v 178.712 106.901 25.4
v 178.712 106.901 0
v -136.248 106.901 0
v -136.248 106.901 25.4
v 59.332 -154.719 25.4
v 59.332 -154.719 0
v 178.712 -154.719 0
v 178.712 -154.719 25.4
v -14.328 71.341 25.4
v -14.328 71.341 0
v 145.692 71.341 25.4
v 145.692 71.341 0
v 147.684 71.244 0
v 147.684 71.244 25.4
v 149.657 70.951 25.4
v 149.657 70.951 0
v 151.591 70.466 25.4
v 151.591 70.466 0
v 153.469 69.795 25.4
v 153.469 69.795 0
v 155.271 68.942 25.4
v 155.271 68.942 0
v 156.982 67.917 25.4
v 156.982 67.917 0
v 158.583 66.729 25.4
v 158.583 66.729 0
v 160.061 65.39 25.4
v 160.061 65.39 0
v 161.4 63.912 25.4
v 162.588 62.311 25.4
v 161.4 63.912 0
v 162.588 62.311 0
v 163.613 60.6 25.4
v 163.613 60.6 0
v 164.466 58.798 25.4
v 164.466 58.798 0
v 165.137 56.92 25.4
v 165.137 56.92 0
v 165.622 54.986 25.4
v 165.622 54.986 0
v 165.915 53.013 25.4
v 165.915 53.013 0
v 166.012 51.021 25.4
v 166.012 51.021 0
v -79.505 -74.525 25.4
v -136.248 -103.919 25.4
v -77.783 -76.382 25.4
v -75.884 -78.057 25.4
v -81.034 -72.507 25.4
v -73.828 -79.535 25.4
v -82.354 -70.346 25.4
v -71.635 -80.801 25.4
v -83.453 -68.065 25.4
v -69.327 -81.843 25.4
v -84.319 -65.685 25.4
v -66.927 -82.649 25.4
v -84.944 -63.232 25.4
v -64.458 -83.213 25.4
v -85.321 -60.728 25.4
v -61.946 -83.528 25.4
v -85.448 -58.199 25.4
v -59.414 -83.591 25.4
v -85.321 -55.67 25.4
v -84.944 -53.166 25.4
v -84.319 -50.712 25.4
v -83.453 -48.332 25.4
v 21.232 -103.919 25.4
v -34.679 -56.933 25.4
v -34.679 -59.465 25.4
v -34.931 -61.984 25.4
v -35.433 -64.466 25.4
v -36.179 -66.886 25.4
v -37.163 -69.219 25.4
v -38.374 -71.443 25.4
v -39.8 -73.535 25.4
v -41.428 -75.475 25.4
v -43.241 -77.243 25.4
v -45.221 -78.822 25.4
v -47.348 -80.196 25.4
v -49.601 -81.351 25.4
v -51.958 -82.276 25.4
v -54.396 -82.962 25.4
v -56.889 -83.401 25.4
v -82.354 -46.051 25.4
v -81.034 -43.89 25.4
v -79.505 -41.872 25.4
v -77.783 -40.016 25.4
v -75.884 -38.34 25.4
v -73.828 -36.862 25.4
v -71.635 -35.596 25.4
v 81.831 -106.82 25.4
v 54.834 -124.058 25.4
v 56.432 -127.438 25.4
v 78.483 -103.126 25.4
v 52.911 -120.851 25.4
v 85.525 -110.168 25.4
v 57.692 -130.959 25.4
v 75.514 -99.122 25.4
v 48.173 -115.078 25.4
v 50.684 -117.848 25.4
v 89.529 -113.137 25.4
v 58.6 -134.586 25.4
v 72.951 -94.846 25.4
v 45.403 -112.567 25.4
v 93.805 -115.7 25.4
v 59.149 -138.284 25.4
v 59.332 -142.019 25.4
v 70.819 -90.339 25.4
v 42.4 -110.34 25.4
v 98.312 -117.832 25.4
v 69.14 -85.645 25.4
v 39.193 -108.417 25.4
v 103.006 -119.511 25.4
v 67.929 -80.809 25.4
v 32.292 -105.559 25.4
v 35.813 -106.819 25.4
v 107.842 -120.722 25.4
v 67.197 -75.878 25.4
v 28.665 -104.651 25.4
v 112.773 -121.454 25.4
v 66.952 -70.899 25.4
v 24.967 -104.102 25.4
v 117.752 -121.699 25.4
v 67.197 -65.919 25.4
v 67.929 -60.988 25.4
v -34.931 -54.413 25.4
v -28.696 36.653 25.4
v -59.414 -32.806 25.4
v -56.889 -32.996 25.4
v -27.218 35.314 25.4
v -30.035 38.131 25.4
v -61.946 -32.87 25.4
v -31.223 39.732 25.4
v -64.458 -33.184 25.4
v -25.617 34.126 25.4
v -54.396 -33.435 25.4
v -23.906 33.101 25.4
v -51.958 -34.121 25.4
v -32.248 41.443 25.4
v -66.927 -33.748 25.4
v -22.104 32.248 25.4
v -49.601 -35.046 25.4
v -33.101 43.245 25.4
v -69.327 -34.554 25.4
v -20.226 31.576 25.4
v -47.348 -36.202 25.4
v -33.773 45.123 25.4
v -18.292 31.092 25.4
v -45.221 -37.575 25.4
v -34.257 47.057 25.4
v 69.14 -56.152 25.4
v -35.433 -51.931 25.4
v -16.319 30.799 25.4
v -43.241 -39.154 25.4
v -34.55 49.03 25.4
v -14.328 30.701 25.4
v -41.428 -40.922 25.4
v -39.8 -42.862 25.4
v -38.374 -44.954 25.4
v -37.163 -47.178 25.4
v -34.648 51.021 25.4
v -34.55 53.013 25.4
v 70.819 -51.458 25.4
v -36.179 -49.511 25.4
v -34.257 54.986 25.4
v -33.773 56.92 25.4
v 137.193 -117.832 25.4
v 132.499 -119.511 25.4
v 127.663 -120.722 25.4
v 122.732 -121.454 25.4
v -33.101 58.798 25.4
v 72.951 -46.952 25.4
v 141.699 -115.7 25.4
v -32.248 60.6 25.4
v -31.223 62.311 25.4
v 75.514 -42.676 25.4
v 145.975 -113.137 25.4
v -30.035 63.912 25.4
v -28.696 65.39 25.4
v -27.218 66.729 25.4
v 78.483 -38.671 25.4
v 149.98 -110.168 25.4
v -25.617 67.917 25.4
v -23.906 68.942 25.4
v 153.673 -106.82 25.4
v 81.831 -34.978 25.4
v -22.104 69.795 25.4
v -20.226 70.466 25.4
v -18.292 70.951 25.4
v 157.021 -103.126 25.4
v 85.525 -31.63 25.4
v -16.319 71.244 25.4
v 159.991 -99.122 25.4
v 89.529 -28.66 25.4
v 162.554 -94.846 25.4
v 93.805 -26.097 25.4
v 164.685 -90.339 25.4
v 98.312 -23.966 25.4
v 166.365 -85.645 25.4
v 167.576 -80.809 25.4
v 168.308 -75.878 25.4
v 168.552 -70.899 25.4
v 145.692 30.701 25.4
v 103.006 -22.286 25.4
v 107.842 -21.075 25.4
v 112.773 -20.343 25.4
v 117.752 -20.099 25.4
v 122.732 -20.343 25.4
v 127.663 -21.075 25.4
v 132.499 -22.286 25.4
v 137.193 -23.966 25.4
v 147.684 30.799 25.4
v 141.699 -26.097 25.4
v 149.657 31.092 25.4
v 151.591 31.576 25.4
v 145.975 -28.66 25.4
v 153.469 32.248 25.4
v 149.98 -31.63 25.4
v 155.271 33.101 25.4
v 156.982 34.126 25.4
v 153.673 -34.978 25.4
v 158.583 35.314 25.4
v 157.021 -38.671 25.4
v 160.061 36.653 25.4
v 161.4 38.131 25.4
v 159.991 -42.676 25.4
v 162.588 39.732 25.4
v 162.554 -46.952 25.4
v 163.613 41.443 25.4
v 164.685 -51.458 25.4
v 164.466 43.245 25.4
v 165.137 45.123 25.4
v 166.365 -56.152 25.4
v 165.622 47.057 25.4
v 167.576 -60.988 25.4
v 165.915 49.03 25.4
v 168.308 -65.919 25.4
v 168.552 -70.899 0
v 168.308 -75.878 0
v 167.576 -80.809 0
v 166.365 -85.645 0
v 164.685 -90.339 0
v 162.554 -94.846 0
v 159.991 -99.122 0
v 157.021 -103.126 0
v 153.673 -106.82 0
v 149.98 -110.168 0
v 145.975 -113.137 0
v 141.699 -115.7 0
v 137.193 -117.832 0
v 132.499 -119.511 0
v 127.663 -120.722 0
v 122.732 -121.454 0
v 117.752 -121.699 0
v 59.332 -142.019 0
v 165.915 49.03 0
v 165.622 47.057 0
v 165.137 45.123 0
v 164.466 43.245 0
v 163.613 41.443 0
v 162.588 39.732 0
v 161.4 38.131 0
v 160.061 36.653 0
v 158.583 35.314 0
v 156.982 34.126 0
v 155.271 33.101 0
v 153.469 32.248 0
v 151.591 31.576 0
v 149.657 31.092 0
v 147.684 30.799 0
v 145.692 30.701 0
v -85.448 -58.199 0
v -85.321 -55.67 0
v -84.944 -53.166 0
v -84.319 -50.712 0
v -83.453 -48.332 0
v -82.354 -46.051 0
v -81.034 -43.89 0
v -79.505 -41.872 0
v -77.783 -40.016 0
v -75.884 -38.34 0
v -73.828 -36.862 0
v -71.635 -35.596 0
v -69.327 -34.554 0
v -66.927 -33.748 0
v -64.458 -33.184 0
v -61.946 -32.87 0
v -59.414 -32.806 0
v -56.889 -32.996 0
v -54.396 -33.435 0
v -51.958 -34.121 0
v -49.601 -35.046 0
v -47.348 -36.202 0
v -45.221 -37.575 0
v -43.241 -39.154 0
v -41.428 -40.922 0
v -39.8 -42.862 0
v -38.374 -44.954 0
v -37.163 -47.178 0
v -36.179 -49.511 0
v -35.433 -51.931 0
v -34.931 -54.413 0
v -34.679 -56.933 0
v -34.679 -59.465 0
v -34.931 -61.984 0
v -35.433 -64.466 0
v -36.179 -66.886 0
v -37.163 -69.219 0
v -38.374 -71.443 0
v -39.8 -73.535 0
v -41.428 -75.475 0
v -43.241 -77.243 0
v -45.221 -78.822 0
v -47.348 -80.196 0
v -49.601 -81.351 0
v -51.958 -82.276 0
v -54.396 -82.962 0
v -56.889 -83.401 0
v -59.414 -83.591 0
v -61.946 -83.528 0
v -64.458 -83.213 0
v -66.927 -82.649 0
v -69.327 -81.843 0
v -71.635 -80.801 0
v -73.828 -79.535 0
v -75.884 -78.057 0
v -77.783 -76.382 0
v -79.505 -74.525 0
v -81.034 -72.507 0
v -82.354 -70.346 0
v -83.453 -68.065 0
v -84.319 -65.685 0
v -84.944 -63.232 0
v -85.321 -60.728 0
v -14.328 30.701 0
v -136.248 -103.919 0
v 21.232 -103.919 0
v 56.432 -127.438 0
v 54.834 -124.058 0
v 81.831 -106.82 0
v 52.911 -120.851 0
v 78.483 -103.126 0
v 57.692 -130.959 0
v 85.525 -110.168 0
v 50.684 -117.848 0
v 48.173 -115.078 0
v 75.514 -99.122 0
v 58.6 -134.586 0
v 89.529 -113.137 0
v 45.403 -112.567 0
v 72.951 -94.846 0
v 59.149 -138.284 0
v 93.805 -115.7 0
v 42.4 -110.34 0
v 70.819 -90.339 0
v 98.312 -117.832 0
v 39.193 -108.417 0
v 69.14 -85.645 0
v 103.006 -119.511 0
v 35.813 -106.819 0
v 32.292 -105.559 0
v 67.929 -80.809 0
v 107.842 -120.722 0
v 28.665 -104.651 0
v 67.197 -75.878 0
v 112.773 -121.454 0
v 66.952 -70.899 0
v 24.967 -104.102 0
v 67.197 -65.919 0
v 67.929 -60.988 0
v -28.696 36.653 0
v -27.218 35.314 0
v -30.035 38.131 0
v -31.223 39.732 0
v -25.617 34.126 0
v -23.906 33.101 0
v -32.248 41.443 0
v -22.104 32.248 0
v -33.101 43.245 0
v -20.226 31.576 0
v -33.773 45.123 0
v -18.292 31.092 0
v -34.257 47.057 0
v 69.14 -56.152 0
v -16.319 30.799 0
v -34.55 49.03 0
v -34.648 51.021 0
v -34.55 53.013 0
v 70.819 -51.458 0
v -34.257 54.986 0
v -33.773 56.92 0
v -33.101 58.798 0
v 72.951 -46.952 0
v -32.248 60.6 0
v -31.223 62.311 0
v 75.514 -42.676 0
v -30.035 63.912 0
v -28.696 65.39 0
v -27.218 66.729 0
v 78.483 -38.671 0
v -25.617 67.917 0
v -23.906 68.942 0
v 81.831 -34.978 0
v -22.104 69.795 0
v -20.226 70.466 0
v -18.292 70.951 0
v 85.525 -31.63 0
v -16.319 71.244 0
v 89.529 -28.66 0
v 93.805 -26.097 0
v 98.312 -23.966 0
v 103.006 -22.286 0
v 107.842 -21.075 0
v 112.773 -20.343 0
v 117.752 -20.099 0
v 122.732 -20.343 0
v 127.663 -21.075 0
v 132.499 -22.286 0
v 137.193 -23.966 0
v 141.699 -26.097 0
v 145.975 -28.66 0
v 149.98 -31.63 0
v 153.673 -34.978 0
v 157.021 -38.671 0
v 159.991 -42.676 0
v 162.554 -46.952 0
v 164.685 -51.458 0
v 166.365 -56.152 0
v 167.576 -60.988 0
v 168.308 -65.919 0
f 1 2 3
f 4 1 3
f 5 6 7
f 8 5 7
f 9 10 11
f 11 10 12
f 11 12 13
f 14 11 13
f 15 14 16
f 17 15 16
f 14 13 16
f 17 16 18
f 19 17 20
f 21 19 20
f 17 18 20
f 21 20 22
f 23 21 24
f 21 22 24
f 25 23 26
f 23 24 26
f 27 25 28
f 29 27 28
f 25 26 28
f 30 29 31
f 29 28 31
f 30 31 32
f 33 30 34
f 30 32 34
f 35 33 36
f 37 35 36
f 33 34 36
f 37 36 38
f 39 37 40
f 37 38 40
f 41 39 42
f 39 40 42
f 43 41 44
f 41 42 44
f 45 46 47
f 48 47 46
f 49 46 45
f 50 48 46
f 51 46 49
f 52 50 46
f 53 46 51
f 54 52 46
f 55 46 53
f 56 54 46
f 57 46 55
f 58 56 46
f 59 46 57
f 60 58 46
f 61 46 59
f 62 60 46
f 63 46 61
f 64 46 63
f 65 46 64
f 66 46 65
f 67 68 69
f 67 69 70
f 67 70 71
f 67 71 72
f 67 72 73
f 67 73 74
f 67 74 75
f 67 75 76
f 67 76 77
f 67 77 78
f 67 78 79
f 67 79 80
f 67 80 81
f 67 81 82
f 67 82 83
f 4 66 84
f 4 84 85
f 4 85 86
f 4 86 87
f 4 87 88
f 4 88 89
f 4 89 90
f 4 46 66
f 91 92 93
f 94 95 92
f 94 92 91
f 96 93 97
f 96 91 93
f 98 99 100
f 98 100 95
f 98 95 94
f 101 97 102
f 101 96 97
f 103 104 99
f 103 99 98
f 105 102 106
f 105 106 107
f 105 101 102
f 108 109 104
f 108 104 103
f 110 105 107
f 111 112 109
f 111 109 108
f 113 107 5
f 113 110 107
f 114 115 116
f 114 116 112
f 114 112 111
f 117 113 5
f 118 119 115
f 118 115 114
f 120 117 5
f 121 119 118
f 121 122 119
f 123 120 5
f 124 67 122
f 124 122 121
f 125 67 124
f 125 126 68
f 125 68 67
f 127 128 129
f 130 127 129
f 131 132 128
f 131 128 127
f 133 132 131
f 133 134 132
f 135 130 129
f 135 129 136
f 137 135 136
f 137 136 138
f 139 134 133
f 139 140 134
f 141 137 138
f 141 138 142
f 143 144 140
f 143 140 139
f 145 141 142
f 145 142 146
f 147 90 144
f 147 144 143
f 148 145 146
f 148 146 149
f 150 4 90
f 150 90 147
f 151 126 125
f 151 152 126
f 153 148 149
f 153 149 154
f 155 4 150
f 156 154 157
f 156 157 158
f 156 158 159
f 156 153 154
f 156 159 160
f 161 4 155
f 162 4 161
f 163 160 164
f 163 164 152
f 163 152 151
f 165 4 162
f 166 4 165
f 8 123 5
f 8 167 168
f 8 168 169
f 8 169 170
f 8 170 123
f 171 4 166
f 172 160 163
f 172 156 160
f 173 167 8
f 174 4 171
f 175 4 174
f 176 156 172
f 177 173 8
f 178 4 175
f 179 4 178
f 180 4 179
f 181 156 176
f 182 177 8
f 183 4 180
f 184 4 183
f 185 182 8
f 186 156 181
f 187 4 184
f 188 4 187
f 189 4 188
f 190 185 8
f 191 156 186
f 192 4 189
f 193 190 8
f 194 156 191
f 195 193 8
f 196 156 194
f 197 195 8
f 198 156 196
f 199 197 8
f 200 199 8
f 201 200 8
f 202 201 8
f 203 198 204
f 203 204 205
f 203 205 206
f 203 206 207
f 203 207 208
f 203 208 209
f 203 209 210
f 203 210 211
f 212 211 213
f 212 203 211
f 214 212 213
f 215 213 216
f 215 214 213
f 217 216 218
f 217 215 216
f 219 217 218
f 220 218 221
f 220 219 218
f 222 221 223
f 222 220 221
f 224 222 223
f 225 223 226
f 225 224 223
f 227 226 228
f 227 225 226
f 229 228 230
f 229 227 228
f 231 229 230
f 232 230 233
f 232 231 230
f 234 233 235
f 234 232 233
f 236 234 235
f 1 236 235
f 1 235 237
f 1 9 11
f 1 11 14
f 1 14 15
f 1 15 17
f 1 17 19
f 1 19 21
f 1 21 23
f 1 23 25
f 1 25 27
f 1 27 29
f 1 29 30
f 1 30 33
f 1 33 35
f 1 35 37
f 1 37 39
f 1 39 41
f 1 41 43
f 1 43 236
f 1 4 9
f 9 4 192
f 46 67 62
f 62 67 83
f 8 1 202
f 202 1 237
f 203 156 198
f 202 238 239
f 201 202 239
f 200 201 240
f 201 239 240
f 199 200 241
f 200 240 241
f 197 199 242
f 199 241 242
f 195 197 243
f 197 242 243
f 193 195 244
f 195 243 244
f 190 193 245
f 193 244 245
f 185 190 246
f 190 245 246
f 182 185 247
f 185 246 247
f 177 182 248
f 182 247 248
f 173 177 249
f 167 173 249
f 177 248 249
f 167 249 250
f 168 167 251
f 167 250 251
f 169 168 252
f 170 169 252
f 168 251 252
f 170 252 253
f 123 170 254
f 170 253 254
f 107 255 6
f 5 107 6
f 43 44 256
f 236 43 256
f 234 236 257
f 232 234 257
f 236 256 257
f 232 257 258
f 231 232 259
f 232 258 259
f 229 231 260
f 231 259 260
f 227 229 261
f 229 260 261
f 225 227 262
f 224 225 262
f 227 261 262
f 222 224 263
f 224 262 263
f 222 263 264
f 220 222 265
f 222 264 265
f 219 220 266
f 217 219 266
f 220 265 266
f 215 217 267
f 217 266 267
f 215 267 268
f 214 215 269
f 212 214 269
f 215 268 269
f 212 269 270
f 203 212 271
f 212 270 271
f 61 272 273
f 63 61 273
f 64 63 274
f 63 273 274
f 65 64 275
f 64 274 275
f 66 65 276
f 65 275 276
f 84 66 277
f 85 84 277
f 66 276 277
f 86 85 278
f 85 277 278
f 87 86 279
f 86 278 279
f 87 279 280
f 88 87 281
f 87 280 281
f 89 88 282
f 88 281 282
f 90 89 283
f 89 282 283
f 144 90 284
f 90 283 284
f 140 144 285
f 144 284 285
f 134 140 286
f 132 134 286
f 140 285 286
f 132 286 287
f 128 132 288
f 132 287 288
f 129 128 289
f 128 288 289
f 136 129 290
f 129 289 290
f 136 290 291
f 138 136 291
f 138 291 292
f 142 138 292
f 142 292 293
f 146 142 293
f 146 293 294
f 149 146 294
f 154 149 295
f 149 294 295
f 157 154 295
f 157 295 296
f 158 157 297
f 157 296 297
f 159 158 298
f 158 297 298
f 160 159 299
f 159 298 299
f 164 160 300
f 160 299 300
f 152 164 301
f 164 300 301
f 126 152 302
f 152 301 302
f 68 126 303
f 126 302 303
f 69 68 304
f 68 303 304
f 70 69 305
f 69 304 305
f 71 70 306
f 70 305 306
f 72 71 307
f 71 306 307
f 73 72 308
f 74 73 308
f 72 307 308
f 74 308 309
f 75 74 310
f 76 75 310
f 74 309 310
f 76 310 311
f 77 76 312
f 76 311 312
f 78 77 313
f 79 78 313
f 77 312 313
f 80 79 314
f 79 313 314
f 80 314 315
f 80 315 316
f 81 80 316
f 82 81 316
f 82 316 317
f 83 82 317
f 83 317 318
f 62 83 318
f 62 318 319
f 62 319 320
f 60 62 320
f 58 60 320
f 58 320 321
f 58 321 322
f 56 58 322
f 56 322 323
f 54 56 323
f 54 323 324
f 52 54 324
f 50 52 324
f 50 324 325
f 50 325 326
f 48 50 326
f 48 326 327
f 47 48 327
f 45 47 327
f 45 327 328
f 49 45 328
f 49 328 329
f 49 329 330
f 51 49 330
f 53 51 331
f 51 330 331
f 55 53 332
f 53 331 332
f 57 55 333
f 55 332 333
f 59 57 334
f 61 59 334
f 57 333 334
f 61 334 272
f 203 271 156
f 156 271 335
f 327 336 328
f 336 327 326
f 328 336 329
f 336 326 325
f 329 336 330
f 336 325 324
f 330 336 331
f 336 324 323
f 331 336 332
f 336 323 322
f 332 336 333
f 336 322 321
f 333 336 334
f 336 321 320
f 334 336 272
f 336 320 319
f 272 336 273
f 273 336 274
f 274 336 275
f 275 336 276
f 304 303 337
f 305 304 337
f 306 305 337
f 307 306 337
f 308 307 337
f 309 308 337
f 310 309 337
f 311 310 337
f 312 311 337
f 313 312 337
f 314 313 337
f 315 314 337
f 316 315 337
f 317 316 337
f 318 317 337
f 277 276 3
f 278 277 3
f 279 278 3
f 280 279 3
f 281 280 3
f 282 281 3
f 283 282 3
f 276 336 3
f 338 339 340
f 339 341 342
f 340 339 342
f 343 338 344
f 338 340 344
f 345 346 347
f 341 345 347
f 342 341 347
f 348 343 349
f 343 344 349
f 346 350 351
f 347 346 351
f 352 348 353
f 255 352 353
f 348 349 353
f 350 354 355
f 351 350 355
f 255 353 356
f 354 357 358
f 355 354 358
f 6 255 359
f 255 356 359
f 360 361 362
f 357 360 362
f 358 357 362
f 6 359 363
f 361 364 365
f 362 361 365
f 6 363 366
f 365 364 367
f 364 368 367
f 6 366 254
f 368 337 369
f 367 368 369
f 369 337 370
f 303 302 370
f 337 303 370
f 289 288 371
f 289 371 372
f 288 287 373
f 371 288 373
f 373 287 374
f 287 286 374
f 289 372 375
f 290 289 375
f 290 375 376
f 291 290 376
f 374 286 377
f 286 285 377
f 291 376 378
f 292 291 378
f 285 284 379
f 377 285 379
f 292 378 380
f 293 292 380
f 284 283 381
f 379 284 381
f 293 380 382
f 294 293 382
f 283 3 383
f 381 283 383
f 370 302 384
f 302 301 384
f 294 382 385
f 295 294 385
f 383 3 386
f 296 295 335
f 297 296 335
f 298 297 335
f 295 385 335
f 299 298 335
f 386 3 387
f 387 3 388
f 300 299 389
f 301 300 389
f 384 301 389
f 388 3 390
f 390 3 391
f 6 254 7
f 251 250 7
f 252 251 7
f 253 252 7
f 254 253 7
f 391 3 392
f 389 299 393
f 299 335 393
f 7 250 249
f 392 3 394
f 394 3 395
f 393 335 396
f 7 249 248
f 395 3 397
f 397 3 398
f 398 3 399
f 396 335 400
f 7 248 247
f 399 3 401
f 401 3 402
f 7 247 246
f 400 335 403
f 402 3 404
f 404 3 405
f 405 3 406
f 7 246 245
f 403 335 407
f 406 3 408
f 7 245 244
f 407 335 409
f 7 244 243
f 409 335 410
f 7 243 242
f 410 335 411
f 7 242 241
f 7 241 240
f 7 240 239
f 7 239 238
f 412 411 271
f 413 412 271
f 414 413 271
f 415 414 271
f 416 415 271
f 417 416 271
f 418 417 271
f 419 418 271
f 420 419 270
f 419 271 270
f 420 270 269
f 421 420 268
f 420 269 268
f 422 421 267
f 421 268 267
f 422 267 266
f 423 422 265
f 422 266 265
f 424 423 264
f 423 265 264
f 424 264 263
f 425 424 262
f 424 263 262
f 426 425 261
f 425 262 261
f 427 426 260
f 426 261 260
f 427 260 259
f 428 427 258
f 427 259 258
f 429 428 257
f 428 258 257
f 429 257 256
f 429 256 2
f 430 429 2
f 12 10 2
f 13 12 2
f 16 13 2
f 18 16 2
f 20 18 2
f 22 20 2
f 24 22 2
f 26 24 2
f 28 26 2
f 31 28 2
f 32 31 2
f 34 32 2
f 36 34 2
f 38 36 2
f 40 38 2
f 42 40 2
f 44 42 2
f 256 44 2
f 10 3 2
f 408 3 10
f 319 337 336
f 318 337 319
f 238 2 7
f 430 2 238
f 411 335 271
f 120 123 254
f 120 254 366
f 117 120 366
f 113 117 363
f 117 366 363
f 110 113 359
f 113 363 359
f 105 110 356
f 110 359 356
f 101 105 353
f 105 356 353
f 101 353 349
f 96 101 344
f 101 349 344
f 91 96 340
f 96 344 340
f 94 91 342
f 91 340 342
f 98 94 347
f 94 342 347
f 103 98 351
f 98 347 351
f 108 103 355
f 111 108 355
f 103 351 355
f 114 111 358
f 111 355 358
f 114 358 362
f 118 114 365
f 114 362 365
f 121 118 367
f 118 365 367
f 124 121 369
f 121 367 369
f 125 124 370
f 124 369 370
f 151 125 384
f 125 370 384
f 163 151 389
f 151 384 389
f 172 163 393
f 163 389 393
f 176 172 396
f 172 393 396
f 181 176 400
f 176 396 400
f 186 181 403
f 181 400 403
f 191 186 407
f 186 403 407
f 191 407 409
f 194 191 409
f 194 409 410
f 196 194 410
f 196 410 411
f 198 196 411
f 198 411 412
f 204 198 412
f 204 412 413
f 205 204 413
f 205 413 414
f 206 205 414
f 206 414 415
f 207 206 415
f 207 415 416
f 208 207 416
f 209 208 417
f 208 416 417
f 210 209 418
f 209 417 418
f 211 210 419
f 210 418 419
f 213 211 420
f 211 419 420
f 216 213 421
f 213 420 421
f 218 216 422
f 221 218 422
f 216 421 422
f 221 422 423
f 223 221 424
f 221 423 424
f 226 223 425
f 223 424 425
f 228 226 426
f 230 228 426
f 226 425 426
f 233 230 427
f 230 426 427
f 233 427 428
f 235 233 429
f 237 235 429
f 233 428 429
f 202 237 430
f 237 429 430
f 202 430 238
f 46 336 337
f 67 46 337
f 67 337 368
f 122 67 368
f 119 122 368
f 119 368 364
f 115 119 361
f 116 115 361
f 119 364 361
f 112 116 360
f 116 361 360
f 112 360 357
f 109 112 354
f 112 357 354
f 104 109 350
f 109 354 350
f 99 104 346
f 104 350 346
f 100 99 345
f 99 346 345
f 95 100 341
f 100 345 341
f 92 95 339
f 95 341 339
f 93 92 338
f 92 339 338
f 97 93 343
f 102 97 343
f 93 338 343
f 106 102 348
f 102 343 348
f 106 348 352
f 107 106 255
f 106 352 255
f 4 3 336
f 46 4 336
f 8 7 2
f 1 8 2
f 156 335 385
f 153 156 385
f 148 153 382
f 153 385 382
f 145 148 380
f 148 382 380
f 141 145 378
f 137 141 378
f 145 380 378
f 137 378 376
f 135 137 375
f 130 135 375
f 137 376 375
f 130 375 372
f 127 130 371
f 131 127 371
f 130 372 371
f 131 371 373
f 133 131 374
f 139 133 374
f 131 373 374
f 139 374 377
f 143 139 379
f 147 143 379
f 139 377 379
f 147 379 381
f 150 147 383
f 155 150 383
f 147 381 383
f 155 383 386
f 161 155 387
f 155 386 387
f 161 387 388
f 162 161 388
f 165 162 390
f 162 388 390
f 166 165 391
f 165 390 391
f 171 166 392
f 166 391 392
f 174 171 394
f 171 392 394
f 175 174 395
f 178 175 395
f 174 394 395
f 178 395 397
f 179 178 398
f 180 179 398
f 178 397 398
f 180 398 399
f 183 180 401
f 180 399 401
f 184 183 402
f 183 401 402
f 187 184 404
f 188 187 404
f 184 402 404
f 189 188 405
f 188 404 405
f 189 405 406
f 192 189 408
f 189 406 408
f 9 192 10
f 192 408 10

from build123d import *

# Parameters (mm, degrees)
F1_DEPTH = 25.4


with BuildPart() as f1:
    # F0 (on Top) → F1 (new body)
    with BuildSketch(Plane.XY):
        with BuildLine():
            ThreePointArc((-34.647605, -58.198605), (-60.047605, -32.798605), (-85.447605, -58.198605))
            ThreePointArc((-85.447605, -58.198605), (-60.047605, -83.598605), (-34.647605, -58.198605))
        make_face()
        with BuildLine():
            ThreePointArc((168.552395, -70.898605), (81.83137, -34.97758), (117.752395, -121.698605))
            ThreePointArc((117.752395, -121.698605), (153.673419, -106.819629), (168.552395, -70.898605))
        make_face()
        with BuildLine():
            Line((178.712395, 106.901395), (-136.247605, 106.901395))
            Line((-136.247605, 106.901395), (-136.247605, -58.198605))
            Line((-136.247605, -58.198605), (-136.247605, -103.918605))
            Line((-136.247605, -103.918605), (21.232395, -103.918605))
            ThreePointArc((21.232395, -103.918605), (48.173163, -115.077836), (59.332395, -142.018605))
            Line((59.332395, -142.018605), (59.332395, -154.718605))
            Line((59.332395, -154.718605), (117.752395, -154.718605))
            Line((117.752395, -154.718605), (178.712395, -154.718605))
            Line((178.712395, -154.718605), (178.712395, 30.701395))
            Line((178.712395, 30.701395), (178.712395, 106.901395))
        make_face()
        with BuildLine():
            ThreePointArc((-34.647605, -58.198605), (-60.047605, -83.598605), (-85.447605, -58.198605))
            ThreePointArc((-85.447605, -58.198605), (-60.047605, -32.798605), (-34.647605, -58.198605))
        make_face(mode=Mode.SUBTRACT)
        with BuildLine():
            ThreePointArc((168.552395, -70.898605), (153.673419, -106.819629), (117.752395, -121.698605))
            ThreePointArc((117.752395, -121.698605), (81.83137, -34.97758), (168.552395, -70.898605))
        make_face(mode=Mode.SUBTRACT)
        with BuildLine():
            Line((-14.327605, 71.341395), (145.692395, 71.341395))
            ThreePointArc((145.692395, 71.341395), (160.060805, 65.389805), (166.012395, 51.021395))
            ThreePointArc((166.012395, 51.021395), (160.060805, 36.652986), (145.692395, 30.701395))
            Line((145.692395, 30.701395), (-14.327605, 30.701395))
            ThreePointArc((-14.327605, 30.701395), (-28.696015, 36.652986), (-34.647605, 51.021395))
            ThreePointArc((-34.647605, 51.021395), (-28.696015, 65.389805), (-14.327605, 71.341395))
        make_face(mode=Mode.SUBTRACT)
    extrude(amount=F1_DEPTH)


solid = f1.part
